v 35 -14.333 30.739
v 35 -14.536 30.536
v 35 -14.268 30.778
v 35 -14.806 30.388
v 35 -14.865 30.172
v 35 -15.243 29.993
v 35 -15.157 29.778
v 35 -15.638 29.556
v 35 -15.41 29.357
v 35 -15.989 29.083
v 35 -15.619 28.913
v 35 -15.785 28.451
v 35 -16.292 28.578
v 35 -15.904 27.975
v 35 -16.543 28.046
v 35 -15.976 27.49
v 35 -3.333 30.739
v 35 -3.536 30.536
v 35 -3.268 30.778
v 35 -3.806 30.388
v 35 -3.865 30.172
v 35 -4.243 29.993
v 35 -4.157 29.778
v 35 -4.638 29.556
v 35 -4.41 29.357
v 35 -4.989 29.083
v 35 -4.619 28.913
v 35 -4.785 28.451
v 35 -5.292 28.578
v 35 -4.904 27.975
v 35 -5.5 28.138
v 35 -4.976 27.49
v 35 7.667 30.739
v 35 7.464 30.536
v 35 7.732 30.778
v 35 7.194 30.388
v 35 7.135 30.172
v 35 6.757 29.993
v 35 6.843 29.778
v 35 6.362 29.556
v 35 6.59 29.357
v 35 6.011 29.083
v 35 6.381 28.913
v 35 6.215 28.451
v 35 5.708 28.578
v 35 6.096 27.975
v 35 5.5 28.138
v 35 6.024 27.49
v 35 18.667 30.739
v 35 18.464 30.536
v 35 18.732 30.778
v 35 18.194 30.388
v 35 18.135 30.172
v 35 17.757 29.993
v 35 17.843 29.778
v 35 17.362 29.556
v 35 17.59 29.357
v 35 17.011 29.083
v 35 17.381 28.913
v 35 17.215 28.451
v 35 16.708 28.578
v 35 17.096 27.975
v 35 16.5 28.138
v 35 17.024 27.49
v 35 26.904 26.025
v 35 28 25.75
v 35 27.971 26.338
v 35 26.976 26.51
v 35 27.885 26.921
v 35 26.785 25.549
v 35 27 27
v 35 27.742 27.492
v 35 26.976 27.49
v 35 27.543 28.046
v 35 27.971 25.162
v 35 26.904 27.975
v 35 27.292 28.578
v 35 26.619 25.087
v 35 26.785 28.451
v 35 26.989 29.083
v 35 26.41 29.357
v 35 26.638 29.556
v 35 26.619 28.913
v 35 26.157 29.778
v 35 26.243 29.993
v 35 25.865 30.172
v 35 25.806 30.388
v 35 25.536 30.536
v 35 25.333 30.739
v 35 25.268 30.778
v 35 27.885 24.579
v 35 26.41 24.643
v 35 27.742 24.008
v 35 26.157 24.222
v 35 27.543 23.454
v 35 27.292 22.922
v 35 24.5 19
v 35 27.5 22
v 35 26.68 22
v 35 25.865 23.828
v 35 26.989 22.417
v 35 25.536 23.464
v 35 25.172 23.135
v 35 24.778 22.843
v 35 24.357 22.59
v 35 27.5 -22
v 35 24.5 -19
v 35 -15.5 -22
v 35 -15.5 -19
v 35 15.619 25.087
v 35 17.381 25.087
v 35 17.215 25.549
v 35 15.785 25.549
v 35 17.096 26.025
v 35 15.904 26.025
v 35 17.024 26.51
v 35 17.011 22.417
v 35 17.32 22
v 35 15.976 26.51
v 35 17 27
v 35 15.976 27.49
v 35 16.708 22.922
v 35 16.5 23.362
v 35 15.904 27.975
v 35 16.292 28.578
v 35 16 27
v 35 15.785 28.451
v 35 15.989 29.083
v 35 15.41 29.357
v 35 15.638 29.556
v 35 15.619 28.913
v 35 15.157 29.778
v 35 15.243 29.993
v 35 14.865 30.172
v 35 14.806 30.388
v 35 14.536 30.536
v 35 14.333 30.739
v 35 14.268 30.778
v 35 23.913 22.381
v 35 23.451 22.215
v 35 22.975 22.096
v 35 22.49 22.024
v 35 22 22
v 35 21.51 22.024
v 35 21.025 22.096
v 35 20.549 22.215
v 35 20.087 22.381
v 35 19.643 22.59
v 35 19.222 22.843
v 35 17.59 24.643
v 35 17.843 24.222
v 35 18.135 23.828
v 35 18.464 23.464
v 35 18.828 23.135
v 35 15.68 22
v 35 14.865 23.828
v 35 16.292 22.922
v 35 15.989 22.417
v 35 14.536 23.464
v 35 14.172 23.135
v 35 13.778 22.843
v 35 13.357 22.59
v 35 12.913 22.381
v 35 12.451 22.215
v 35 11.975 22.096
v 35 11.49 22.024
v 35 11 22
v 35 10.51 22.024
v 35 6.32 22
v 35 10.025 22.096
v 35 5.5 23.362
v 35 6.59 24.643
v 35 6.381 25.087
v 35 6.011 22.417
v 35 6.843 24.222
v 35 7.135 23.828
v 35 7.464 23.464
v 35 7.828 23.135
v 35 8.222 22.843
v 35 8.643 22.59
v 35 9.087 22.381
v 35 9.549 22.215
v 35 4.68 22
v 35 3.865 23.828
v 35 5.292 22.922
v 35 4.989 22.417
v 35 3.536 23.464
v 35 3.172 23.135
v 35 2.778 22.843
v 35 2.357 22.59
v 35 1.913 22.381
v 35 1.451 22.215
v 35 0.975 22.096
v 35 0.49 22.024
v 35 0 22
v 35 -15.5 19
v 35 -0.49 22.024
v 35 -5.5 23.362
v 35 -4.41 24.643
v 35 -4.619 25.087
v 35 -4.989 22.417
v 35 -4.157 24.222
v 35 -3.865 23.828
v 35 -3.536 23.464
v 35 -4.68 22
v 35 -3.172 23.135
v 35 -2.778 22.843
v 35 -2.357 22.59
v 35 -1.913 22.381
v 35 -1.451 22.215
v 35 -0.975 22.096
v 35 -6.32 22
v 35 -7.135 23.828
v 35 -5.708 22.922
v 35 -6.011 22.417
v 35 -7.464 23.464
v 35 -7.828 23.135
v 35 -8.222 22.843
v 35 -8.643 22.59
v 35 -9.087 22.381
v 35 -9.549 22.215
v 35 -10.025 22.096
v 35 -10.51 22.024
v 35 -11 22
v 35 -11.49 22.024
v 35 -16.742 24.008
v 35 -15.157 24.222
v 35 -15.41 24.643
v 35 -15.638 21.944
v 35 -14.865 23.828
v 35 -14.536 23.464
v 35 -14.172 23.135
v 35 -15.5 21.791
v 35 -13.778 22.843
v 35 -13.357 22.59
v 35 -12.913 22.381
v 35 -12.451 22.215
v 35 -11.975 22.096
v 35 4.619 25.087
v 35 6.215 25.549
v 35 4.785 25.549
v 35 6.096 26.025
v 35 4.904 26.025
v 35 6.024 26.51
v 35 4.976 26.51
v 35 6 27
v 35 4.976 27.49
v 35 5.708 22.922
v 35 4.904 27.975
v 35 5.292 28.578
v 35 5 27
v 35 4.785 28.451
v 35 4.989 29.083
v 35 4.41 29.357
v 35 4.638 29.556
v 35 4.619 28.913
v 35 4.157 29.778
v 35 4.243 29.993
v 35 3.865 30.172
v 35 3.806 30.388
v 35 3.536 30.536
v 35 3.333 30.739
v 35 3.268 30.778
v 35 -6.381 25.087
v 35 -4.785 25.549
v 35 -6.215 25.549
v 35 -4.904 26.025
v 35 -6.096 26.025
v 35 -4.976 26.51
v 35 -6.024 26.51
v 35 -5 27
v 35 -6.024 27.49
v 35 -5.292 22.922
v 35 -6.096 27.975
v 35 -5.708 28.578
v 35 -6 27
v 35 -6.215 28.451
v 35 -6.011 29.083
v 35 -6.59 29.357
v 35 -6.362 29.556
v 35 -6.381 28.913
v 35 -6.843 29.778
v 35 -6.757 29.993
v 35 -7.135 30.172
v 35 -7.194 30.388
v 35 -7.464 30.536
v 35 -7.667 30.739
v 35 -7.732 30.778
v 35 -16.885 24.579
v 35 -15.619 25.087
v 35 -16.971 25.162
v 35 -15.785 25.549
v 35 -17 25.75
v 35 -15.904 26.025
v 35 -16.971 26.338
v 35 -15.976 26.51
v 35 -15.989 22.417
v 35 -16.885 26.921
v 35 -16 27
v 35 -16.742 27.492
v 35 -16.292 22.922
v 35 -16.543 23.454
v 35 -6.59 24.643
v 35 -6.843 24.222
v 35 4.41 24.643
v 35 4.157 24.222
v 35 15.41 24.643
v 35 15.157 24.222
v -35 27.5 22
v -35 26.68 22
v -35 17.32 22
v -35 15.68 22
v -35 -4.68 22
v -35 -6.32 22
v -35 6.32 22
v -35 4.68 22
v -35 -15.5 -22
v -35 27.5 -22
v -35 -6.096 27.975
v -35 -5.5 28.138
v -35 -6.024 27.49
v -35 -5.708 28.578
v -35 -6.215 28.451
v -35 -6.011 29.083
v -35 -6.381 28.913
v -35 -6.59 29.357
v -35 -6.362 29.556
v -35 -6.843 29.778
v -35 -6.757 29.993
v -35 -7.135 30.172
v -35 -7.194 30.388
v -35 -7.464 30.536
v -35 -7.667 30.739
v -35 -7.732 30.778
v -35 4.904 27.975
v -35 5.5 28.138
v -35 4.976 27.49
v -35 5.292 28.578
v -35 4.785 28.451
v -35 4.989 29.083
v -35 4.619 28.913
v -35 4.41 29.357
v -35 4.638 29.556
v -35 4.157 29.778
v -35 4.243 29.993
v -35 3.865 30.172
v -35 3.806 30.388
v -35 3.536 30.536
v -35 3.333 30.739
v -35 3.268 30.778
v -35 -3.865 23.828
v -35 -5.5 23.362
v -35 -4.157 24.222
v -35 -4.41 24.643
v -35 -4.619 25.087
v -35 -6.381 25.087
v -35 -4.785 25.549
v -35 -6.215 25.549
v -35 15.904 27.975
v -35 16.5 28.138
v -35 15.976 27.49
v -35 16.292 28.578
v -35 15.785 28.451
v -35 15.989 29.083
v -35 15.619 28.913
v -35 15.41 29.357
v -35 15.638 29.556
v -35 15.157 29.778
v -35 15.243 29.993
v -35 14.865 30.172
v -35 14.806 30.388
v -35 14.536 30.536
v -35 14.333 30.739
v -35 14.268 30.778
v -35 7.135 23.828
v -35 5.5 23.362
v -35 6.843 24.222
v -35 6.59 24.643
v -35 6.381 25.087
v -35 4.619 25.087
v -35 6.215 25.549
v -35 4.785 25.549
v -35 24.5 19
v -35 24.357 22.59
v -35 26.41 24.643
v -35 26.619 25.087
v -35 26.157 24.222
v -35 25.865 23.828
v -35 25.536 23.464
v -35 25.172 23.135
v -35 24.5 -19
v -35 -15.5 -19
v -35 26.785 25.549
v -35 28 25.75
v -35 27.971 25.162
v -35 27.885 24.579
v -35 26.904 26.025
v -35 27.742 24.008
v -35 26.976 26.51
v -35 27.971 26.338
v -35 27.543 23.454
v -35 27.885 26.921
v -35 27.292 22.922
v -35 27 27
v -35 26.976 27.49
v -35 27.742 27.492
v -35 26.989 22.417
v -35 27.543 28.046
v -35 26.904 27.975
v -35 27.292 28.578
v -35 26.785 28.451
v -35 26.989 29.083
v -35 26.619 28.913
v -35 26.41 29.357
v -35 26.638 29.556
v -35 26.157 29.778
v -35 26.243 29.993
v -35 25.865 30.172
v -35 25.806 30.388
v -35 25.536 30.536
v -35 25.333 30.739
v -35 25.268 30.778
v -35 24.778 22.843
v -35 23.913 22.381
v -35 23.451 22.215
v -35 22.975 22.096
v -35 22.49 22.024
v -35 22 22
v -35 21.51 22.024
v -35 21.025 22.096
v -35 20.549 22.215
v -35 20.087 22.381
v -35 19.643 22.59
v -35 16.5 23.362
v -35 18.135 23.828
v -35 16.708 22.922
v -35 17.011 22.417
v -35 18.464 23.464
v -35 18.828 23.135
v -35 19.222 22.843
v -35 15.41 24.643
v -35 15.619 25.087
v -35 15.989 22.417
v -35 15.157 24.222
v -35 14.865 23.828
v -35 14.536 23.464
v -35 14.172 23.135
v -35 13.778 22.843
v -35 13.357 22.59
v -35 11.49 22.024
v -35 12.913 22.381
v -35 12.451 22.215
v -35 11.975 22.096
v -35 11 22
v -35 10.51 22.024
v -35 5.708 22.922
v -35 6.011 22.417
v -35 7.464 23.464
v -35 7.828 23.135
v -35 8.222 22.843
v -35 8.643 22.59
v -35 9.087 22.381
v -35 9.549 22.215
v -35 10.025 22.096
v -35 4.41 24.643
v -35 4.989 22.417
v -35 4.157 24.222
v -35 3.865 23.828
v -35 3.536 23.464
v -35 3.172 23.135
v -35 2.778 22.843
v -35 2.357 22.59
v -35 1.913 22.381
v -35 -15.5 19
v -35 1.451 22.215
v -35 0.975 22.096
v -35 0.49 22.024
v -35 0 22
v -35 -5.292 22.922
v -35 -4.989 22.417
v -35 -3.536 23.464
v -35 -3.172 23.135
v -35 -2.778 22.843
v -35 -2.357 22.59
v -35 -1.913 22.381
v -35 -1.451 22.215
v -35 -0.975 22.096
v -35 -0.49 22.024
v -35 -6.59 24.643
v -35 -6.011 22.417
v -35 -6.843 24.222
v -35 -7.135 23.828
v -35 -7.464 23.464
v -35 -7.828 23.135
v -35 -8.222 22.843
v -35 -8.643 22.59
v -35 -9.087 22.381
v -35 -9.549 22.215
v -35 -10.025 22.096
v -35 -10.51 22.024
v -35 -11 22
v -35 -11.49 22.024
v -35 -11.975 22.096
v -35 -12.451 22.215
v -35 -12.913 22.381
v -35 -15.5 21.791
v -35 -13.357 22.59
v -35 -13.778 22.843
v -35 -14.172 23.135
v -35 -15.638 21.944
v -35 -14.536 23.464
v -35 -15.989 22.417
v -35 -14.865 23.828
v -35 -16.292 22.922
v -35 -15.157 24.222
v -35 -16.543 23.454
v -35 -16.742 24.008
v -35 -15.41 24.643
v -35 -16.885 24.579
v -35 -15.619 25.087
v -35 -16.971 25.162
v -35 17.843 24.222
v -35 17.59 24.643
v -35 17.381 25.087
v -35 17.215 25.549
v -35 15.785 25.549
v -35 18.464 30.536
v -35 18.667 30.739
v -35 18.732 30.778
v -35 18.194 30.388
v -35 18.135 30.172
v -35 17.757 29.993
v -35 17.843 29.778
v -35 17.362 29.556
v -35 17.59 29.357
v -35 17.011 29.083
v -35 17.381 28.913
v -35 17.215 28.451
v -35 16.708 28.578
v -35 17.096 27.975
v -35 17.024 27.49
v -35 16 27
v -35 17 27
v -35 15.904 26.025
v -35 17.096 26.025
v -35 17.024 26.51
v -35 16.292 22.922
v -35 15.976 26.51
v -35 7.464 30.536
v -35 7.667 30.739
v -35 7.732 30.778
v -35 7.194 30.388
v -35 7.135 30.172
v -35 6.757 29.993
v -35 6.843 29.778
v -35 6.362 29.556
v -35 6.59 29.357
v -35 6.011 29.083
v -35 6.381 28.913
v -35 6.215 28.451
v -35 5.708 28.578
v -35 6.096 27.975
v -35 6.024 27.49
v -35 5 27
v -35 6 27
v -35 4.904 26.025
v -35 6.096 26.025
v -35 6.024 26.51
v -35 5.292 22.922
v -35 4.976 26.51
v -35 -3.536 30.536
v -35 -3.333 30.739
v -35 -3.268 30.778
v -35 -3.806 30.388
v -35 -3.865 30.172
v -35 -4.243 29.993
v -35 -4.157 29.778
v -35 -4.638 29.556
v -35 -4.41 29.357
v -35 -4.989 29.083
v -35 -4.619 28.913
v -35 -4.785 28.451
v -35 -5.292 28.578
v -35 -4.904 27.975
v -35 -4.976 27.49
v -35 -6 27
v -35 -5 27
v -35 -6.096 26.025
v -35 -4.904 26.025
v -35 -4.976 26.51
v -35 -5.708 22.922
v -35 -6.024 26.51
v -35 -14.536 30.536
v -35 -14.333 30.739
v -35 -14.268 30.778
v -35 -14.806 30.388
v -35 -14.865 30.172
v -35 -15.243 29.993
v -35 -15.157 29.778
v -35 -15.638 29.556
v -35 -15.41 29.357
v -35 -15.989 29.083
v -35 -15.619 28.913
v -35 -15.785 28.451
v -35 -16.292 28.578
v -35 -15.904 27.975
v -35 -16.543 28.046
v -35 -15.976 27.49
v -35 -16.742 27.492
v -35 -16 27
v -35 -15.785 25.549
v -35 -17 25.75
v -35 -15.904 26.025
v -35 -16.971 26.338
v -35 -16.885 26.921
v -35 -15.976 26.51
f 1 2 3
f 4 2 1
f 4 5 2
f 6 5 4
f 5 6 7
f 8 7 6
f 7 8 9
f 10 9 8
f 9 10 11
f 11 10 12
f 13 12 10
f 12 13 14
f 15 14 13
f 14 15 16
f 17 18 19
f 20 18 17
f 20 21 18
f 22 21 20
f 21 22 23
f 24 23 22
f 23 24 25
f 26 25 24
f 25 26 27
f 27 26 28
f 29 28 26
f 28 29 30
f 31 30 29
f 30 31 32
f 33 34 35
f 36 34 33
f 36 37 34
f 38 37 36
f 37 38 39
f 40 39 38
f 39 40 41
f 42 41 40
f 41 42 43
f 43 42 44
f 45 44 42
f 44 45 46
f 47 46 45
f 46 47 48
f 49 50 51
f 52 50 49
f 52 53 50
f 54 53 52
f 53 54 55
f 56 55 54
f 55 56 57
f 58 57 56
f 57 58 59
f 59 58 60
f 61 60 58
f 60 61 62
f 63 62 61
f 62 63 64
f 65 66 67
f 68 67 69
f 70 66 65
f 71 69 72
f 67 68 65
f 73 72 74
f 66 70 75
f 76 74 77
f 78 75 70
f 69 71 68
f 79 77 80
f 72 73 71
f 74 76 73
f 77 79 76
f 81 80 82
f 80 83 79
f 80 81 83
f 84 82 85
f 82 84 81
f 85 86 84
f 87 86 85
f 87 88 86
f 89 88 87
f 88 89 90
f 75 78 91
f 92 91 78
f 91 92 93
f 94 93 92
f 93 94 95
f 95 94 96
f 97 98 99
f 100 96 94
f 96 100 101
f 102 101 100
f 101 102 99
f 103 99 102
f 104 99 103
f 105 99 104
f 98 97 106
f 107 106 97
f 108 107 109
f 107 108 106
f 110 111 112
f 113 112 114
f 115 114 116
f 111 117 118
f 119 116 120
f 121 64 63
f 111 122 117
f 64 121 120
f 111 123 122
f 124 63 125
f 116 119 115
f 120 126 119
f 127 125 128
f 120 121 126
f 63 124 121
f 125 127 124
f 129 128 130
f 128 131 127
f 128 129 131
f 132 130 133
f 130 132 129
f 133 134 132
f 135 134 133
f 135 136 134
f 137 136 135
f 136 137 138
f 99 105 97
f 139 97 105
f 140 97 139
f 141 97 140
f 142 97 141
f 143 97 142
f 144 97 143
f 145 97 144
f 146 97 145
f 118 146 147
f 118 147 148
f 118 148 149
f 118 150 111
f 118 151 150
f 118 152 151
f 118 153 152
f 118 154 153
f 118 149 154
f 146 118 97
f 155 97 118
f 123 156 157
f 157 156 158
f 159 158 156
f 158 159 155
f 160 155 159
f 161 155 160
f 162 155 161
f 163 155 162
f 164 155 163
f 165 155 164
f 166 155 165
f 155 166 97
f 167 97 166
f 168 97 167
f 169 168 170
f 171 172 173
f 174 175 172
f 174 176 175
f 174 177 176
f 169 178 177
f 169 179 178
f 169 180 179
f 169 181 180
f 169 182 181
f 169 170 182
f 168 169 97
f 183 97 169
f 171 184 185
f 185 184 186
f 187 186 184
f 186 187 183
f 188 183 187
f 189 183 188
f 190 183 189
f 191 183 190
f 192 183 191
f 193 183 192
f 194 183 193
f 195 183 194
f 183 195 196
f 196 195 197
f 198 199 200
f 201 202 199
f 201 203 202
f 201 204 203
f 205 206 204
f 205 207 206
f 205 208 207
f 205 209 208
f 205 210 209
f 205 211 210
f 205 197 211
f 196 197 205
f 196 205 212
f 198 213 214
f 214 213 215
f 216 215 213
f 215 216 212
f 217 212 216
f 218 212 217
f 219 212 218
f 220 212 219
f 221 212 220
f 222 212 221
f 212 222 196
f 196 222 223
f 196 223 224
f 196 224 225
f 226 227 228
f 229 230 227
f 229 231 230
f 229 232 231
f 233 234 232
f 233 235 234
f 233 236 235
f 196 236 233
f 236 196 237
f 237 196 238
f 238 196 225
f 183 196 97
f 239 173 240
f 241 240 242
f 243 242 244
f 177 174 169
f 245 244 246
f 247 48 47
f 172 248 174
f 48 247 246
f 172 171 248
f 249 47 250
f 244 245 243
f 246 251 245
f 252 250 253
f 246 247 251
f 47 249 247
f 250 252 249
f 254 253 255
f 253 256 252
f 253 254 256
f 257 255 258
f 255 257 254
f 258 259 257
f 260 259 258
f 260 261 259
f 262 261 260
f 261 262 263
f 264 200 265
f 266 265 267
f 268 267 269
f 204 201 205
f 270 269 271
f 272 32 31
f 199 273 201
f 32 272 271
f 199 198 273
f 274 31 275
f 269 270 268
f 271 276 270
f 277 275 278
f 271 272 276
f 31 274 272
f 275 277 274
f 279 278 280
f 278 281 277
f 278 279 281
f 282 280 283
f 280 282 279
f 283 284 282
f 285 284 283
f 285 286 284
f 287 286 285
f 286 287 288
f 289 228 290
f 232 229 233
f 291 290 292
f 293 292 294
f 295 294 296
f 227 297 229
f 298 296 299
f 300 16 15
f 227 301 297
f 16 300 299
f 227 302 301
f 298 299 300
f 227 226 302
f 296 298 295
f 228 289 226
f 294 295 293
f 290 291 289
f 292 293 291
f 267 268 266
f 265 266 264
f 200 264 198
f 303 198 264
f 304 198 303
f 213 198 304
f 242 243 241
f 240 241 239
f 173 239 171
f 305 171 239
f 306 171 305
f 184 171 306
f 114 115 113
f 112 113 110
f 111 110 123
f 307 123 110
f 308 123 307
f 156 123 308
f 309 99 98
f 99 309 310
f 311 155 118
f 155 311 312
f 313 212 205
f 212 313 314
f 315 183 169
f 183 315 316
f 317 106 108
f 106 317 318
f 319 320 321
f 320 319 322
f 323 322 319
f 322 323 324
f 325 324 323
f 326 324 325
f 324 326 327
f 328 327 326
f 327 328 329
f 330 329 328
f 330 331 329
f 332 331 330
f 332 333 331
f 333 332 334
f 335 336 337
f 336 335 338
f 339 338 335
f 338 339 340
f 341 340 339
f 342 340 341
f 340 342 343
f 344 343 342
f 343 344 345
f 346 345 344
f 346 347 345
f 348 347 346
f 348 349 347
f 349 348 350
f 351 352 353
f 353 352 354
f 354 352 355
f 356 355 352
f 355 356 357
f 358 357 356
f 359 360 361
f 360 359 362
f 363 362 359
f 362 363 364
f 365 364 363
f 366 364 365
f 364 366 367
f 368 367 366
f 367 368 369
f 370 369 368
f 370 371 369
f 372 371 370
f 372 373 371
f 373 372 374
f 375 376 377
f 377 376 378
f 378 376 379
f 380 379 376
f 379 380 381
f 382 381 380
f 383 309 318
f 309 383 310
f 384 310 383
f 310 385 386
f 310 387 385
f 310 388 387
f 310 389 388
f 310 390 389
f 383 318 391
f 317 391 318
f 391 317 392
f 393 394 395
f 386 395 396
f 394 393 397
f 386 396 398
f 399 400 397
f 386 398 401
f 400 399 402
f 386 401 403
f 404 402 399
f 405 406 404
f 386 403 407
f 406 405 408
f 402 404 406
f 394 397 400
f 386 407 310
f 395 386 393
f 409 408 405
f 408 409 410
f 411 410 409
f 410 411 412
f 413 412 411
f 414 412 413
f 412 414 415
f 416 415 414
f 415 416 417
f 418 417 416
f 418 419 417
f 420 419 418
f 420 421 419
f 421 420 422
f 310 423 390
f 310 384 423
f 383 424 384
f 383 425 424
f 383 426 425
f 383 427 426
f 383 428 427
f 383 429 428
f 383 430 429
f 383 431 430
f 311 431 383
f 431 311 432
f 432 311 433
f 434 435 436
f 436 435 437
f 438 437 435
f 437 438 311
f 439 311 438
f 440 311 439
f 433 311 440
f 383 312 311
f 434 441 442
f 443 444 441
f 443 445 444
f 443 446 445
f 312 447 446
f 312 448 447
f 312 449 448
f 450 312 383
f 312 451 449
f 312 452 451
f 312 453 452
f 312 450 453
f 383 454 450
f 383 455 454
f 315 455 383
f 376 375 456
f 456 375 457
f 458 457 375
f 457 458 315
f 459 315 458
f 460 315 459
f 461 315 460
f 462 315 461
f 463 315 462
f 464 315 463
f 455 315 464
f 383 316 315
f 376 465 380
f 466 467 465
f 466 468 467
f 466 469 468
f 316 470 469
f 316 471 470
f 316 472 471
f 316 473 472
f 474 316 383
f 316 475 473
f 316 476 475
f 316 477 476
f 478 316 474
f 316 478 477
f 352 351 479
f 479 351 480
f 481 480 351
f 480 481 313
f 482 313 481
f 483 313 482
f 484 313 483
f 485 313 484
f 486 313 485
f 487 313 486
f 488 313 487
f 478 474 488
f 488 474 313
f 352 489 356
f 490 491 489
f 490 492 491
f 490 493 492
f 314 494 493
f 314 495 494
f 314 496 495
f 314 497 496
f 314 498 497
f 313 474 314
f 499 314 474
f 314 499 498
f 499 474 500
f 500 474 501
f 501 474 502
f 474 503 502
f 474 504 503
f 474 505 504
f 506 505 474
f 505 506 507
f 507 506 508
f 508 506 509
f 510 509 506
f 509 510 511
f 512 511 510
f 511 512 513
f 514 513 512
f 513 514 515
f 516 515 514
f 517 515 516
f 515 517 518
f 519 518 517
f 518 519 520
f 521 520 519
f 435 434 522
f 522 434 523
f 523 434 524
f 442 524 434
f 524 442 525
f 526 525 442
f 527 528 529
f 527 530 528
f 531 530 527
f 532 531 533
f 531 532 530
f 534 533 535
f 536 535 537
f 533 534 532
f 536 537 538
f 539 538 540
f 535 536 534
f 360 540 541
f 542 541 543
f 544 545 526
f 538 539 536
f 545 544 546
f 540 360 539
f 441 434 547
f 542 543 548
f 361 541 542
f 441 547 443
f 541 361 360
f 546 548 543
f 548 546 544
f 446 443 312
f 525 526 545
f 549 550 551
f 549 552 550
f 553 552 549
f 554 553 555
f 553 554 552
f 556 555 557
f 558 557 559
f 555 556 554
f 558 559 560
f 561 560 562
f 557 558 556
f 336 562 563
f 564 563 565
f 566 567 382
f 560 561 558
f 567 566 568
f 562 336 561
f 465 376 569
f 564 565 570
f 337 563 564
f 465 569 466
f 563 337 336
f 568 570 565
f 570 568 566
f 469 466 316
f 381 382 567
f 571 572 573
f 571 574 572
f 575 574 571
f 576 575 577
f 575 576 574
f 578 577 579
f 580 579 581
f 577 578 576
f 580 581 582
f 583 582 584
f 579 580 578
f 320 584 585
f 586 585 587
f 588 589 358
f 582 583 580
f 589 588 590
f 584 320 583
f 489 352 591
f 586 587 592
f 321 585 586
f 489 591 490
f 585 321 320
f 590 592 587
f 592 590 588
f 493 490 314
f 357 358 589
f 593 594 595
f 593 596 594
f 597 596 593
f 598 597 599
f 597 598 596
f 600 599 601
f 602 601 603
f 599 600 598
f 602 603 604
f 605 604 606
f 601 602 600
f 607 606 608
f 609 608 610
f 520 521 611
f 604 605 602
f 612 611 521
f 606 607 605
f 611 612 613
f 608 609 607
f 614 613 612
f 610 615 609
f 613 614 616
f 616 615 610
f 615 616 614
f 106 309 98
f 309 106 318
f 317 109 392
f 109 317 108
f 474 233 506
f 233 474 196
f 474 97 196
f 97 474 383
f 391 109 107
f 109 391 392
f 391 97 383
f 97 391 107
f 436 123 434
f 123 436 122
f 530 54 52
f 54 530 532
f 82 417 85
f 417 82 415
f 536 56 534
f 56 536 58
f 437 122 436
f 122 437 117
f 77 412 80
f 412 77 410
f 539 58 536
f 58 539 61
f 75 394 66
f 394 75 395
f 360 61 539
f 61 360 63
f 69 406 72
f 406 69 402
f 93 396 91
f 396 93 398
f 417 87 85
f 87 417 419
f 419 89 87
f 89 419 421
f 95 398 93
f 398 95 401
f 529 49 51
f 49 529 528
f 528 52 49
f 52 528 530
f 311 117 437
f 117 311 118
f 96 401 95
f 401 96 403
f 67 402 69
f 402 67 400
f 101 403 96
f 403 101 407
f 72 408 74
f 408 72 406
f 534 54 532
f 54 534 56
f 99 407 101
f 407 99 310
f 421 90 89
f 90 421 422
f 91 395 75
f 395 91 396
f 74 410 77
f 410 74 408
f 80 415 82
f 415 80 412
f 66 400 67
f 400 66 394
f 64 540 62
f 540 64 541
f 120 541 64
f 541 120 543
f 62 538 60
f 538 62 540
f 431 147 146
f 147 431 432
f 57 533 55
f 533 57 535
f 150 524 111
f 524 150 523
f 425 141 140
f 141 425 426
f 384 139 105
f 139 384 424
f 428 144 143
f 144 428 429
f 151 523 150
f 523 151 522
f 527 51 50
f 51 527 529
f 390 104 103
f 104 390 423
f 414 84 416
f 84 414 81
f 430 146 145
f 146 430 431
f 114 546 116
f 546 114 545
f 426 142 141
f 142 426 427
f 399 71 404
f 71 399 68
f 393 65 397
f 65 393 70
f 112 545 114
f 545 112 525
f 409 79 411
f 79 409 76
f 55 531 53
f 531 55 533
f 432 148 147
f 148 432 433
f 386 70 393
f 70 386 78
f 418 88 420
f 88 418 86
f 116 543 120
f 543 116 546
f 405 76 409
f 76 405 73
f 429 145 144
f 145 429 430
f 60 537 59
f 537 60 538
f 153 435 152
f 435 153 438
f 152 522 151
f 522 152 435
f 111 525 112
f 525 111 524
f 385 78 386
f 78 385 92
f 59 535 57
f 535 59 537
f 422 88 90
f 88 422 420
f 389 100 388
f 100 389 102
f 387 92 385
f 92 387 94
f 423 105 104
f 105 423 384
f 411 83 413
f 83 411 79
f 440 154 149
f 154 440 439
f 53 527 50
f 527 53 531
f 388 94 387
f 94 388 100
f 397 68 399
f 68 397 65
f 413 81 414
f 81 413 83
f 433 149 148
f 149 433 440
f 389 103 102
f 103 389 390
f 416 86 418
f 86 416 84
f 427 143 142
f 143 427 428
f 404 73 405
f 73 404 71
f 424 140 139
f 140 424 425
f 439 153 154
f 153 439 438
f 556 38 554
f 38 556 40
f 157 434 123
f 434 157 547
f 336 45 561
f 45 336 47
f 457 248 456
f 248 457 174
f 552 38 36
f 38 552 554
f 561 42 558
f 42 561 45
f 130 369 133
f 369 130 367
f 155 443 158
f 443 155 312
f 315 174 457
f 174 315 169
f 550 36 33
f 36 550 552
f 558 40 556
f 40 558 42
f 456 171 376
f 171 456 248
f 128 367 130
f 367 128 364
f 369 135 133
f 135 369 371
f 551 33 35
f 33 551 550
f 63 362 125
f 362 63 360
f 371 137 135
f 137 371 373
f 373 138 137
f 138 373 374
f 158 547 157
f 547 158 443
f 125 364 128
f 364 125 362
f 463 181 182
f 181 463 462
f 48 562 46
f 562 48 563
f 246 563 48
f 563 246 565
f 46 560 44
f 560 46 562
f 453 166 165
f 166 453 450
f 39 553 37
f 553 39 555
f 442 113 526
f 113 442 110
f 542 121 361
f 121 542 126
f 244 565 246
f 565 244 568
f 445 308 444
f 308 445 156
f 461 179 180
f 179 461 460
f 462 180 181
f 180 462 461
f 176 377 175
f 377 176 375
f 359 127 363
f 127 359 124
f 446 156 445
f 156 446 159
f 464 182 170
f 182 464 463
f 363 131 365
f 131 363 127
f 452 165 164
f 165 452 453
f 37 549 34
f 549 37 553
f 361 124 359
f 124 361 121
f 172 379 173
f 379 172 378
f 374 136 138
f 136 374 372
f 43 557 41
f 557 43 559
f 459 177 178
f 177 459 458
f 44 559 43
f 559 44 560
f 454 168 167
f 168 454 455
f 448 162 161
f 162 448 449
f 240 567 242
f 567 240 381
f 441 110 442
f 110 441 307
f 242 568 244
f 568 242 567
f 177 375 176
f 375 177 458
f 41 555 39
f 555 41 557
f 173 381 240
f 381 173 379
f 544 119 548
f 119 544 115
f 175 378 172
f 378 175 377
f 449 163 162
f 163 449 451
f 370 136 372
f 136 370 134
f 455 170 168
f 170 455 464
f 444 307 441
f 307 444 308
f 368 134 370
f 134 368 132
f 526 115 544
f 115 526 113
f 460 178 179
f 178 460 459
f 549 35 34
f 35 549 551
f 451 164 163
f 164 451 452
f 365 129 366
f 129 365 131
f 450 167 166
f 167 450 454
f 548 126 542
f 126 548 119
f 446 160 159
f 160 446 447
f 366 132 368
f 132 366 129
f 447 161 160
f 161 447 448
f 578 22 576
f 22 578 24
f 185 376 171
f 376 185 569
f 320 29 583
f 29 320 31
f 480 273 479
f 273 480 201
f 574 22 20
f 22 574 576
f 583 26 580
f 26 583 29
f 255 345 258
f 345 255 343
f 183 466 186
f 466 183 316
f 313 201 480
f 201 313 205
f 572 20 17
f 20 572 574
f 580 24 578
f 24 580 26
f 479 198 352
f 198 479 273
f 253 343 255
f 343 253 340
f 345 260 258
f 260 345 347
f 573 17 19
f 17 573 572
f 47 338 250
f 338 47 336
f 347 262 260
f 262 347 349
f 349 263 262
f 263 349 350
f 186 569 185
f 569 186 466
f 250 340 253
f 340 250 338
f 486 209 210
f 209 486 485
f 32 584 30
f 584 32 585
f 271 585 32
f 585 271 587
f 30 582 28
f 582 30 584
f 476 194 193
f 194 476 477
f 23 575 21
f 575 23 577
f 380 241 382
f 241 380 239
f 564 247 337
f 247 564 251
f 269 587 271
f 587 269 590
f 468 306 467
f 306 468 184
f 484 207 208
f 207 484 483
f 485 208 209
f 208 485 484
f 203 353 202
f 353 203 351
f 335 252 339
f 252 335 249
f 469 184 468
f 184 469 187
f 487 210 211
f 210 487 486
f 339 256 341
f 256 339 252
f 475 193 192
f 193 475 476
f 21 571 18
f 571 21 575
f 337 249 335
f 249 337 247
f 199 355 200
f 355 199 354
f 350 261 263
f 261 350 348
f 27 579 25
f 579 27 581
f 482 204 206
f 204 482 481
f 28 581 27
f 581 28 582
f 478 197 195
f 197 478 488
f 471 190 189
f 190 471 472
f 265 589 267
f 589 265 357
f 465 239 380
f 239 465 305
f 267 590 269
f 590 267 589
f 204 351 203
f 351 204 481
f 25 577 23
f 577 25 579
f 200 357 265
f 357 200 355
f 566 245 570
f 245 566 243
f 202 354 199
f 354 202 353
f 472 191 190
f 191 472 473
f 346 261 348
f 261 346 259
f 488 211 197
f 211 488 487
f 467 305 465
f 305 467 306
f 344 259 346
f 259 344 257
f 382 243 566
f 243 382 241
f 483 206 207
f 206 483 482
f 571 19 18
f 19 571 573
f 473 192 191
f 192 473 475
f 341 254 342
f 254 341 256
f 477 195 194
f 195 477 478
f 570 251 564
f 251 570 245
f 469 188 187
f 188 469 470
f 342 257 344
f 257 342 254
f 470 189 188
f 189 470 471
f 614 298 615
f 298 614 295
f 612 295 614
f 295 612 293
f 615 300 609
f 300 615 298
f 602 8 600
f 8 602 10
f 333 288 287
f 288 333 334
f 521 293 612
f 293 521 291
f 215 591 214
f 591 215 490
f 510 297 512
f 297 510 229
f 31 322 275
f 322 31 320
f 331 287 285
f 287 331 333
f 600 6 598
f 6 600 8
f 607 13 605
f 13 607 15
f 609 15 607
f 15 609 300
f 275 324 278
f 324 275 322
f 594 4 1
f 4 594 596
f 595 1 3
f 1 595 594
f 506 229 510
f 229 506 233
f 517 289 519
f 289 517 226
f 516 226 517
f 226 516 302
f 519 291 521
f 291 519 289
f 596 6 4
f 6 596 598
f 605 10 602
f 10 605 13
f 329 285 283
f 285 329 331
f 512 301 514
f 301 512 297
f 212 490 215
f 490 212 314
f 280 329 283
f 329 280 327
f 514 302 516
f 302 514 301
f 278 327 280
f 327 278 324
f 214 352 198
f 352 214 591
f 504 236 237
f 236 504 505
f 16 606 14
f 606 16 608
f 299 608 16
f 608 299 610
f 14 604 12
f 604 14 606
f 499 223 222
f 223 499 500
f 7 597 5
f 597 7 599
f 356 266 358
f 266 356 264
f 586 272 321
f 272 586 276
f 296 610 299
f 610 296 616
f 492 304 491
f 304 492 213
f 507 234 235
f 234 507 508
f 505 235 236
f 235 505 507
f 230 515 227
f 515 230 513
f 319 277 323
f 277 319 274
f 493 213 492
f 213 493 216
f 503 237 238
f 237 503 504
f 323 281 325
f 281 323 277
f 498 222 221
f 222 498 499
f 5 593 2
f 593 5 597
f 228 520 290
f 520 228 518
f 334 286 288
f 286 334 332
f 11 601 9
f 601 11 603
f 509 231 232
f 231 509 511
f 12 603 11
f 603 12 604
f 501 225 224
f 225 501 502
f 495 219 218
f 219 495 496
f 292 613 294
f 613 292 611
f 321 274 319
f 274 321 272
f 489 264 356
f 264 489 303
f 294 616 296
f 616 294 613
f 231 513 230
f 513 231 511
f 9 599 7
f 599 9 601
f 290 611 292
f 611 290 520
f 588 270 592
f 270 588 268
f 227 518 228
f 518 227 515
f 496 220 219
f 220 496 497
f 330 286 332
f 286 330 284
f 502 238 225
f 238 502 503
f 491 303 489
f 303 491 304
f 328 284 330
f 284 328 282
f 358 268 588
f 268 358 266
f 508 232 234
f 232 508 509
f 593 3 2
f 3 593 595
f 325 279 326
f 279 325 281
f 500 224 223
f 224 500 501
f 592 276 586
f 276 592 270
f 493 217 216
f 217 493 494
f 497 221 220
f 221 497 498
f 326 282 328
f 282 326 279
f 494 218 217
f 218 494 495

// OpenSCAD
clamp_length = 70;
clamp_depth = 40;
clamp_space_height = 38;
clamp_outwards_thickness = 3;
cable_holder_radius = 5;
cable_holder_outwards_thickness = 1;
cable_holder_offset = 1;
cable_holder_length = 70;
cable_holder_count = 4;
cable_holder_attach_height_offset = 1;
cable_holder_x_offset = -22;
$fn= $preview ? 32 : 64;

module base() {
 difference() {
    color("red", 0.5)
    translate([0, clamp_outwards_thickness * 2, 0])
    cube(
        [
            clamp_length, 
            clamp_depth + clamp_outwards_thickness,
            clamp_space_height + clamp_outwards_thickness * 2
        ],
        true
    );
    color("blue", 0.5)
    translate([0, clamp_outwards_thickness * 1.5, 0])
    cube(
        [clamp_length, clamp_depth, clamp_space_height],
        true
    );
  }  
}

module cable_holder() {
    for ( i = [0 : cable_holder_count - 1] ){
        cable_holder_diameter = cable_holder_radius * 2;
        difference() {
            translate([
                i * (cable_holder_diameter + cable_holder_offset), 
                -cable_holder_outwards_thickness - 0.25, 
                0
            ])
            color("red", 0.5)
            cylinder(
                r = cable_holder_radius + cable_holder_outwards_thickness,
                h = cable_holder_length, 
                center = true
            );        
            translate([
                i * (cable_holder_diameter + cable_holder_offset), 
                0, 
                0
            ])
            color("blue", 0.5)
            cylinder(
                r = cable_holder_radius,
                h = cable_holder_length, 
                center = true
            );
        }
    }    
}

base();

rotate([90, 0, -90]) 
translate([
    cable_holder_x_offset,
    (clamp_space_height / 2 + clamp_outwards_thickness + cable_holder_radius + cable_holder_outwards_thickness) - cable_holder_attach_height_offset,
    (clamp_length - cable_holder_length) / 2
])
cable_holder();
